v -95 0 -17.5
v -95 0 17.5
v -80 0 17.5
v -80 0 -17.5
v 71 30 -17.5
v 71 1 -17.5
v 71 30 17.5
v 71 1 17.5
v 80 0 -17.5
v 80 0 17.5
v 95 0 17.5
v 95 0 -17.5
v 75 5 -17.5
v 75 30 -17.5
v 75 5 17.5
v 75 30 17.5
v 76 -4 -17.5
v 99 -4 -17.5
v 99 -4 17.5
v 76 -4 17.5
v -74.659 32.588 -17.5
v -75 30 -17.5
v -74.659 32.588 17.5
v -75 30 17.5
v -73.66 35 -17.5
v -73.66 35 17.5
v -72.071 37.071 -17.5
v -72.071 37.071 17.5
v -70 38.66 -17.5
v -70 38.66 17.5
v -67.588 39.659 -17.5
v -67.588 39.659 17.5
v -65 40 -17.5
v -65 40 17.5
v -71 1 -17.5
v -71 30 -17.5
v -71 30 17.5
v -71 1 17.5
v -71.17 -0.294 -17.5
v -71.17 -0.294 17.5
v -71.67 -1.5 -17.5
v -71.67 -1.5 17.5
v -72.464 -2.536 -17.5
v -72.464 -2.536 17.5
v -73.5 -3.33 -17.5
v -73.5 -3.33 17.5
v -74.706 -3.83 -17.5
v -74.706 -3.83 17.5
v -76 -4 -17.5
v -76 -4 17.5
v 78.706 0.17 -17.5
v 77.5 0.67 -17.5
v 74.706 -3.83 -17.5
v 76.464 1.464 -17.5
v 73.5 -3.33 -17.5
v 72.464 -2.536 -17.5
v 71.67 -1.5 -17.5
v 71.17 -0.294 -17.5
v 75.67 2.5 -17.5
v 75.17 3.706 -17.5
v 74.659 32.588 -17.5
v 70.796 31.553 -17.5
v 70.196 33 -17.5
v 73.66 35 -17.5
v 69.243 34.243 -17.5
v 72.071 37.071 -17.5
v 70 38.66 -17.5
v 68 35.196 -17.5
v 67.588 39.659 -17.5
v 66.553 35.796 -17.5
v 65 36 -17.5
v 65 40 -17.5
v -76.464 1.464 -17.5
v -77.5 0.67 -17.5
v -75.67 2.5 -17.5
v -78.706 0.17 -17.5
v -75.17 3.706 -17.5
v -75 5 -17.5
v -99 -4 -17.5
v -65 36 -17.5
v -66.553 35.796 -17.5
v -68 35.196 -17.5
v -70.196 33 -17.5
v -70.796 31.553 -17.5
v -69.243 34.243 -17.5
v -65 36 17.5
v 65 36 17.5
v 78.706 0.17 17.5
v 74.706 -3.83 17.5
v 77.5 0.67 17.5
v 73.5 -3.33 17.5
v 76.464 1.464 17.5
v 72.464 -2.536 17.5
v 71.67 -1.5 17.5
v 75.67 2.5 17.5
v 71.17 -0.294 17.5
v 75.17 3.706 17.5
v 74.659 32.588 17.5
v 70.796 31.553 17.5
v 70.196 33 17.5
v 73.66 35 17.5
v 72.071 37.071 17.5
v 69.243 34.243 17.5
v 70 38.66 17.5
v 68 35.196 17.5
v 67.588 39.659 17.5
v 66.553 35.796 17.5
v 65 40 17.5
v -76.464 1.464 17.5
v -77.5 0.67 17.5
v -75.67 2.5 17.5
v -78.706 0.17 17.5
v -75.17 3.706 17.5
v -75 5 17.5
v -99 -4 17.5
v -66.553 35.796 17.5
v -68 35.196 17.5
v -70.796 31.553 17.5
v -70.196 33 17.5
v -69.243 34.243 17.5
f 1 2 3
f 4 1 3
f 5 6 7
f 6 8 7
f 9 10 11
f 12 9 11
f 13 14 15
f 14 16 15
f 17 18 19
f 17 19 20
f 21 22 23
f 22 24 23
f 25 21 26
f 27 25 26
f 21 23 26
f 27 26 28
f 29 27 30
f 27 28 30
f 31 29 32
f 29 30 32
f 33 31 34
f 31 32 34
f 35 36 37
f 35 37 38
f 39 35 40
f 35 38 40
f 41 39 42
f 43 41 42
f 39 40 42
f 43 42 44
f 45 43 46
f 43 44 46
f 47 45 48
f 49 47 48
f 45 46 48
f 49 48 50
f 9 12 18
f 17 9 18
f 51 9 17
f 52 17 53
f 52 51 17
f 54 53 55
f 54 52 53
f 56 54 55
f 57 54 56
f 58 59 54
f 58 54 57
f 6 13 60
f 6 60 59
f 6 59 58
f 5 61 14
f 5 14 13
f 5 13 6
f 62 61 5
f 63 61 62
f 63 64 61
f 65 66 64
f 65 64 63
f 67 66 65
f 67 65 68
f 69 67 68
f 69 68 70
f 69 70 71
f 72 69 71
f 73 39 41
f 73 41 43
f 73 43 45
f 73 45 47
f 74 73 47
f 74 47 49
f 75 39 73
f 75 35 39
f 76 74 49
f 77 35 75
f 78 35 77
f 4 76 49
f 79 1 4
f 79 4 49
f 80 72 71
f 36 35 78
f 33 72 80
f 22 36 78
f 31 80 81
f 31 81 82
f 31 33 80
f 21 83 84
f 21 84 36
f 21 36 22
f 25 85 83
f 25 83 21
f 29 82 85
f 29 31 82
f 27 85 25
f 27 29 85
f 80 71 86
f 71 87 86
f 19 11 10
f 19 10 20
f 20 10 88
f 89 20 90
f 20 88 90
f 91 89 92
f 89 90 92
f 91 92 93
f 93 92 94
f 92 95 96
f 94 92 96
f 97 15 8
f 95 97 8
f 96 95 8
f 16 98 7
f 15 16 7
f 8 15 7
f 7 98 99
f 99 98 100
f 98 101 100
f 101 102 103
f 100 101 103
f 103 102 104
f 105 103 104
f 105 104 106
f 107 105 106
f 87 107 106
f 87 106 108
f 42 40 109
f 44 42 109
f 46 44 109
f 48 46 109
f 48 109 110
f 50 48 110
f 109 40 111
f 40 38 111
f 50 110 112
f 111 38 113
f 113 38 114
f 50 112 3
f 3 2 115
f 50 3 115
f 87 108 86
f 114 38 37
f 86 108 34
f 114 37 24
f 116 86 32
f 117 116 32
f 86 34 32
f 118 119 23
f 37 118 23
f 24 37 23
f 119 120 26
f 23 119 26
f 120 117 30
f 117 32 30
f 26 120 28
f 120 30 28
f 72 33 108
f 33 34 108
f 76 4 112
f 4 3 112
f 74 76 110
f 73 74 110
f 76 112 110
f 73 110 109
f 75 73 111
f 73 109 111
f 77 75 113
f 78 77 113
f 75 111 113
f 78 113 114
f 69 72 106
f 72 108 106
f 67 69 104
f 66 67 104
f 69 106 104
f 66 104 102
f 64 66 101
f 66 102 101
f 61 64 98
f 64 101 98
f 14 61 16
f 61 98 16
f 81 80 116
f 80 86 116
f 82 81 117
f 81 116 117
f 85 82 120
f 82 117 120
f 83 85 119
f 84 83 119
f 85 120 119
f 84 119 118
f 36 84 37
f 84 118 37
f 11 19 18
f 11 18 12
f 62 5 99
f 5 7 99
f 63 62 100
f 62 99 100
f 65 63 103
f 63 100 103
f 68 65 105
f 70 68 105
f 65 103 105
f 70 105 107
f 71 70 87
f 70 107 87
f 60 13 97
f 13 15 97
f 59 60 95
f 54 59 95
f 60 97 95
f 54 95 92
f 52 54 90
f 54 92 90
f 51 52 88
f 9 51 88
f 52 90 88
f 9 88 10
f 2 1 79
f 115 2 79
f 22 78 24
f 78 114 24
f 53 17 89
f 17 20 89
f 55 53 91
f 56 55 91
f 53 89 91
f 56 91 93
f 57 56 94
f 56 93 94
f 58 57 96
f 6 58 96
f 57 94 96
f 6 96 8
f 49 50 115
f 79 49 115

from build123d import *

# Parameters (mm, degrees)
BOSS_EXTRUDE1_DEPTH = 17.5
CHAMFER1_SIZE       = 5


with BuildPart() as part:
    # Sketch1 → Boss-Extrude1 (new, symmetric)
    with BuildSketch(Plane.XY):
        with BuildLine():
            Line((-100, 0), (-80, 0))
            ThreePointArc((-80, 0), (-76.464466094, 1.464466094), (-75, 5))
            Line((-75, 5), (-75, 30))
            ThreePointArc((-75, 30), (-72.071067812, 37.071067812), (-65, 40))
            Line((-65, 40), (65, 40))
            ThreePointArc((65, 40), (72.071067812, 37.071067812), (75, 30))
            Line((75, 30), (75, 5))
            ThreePointArc((75, 5), (76.464466094, 1.464466094), (80, 0))
            Line((80, 0), (100, 0))
            Line((100, 0), (100, -4))
            Line((100, -4), (76, -4))
            ThreePointArc((76, -4), (72.464466094, -2.535533906), (71, 1))
            Line((71, 1), (71, 30))
            ThreePointArc((71, 30), (69.242640687, 34.242640687), (65, 36))
            Line((65, 36), (-65, 36))
            ThreePointArc((-65, 36), (-69.242640687, 34.242640687), (-71, 30))
            Line((-71, 30), (-71, 1))
            ThreePointArc((-71, 1), (-72.464466094, -2.535533906), (-76, -4))
            Line((-76, -4), (-100, -4))
            Line((-100, -4), (-100, 0))
        make_face()
    extrude(amount=BOSS_EXTRUDE1_DEPTH, both=True)

    # Chamfer1
    # the kernel refuses this chamfer: 5 mm, written as the material it takes off along each edge
    with BuildSketch(Plane(origin=(-100, 0, 30.35841494), x_dir=(0.9996219169112968, 0.027495876610586334, 0), z_dir=(0, 0, -1)), Plane(origin=(100, 0, 30.35841494), x_dir=(0.0274958766105877, -0.9996219169112968, 0), z_dir=(0, 0, -1))) as chamfer1_piece_1:
        Polygon((CHAMFER1_SIZE * 0.999621916911, CHAMFER1_SIZE * 0.0274958766106), (-CHAMFER1_SIZE * 0.0274958766106, CHAMFER1_SIZE * 0.999621916911), (0, 0), align=None)
    extrude(amount=60.71682988, mode=Mode.SUBTRACT)


solid = part.part
